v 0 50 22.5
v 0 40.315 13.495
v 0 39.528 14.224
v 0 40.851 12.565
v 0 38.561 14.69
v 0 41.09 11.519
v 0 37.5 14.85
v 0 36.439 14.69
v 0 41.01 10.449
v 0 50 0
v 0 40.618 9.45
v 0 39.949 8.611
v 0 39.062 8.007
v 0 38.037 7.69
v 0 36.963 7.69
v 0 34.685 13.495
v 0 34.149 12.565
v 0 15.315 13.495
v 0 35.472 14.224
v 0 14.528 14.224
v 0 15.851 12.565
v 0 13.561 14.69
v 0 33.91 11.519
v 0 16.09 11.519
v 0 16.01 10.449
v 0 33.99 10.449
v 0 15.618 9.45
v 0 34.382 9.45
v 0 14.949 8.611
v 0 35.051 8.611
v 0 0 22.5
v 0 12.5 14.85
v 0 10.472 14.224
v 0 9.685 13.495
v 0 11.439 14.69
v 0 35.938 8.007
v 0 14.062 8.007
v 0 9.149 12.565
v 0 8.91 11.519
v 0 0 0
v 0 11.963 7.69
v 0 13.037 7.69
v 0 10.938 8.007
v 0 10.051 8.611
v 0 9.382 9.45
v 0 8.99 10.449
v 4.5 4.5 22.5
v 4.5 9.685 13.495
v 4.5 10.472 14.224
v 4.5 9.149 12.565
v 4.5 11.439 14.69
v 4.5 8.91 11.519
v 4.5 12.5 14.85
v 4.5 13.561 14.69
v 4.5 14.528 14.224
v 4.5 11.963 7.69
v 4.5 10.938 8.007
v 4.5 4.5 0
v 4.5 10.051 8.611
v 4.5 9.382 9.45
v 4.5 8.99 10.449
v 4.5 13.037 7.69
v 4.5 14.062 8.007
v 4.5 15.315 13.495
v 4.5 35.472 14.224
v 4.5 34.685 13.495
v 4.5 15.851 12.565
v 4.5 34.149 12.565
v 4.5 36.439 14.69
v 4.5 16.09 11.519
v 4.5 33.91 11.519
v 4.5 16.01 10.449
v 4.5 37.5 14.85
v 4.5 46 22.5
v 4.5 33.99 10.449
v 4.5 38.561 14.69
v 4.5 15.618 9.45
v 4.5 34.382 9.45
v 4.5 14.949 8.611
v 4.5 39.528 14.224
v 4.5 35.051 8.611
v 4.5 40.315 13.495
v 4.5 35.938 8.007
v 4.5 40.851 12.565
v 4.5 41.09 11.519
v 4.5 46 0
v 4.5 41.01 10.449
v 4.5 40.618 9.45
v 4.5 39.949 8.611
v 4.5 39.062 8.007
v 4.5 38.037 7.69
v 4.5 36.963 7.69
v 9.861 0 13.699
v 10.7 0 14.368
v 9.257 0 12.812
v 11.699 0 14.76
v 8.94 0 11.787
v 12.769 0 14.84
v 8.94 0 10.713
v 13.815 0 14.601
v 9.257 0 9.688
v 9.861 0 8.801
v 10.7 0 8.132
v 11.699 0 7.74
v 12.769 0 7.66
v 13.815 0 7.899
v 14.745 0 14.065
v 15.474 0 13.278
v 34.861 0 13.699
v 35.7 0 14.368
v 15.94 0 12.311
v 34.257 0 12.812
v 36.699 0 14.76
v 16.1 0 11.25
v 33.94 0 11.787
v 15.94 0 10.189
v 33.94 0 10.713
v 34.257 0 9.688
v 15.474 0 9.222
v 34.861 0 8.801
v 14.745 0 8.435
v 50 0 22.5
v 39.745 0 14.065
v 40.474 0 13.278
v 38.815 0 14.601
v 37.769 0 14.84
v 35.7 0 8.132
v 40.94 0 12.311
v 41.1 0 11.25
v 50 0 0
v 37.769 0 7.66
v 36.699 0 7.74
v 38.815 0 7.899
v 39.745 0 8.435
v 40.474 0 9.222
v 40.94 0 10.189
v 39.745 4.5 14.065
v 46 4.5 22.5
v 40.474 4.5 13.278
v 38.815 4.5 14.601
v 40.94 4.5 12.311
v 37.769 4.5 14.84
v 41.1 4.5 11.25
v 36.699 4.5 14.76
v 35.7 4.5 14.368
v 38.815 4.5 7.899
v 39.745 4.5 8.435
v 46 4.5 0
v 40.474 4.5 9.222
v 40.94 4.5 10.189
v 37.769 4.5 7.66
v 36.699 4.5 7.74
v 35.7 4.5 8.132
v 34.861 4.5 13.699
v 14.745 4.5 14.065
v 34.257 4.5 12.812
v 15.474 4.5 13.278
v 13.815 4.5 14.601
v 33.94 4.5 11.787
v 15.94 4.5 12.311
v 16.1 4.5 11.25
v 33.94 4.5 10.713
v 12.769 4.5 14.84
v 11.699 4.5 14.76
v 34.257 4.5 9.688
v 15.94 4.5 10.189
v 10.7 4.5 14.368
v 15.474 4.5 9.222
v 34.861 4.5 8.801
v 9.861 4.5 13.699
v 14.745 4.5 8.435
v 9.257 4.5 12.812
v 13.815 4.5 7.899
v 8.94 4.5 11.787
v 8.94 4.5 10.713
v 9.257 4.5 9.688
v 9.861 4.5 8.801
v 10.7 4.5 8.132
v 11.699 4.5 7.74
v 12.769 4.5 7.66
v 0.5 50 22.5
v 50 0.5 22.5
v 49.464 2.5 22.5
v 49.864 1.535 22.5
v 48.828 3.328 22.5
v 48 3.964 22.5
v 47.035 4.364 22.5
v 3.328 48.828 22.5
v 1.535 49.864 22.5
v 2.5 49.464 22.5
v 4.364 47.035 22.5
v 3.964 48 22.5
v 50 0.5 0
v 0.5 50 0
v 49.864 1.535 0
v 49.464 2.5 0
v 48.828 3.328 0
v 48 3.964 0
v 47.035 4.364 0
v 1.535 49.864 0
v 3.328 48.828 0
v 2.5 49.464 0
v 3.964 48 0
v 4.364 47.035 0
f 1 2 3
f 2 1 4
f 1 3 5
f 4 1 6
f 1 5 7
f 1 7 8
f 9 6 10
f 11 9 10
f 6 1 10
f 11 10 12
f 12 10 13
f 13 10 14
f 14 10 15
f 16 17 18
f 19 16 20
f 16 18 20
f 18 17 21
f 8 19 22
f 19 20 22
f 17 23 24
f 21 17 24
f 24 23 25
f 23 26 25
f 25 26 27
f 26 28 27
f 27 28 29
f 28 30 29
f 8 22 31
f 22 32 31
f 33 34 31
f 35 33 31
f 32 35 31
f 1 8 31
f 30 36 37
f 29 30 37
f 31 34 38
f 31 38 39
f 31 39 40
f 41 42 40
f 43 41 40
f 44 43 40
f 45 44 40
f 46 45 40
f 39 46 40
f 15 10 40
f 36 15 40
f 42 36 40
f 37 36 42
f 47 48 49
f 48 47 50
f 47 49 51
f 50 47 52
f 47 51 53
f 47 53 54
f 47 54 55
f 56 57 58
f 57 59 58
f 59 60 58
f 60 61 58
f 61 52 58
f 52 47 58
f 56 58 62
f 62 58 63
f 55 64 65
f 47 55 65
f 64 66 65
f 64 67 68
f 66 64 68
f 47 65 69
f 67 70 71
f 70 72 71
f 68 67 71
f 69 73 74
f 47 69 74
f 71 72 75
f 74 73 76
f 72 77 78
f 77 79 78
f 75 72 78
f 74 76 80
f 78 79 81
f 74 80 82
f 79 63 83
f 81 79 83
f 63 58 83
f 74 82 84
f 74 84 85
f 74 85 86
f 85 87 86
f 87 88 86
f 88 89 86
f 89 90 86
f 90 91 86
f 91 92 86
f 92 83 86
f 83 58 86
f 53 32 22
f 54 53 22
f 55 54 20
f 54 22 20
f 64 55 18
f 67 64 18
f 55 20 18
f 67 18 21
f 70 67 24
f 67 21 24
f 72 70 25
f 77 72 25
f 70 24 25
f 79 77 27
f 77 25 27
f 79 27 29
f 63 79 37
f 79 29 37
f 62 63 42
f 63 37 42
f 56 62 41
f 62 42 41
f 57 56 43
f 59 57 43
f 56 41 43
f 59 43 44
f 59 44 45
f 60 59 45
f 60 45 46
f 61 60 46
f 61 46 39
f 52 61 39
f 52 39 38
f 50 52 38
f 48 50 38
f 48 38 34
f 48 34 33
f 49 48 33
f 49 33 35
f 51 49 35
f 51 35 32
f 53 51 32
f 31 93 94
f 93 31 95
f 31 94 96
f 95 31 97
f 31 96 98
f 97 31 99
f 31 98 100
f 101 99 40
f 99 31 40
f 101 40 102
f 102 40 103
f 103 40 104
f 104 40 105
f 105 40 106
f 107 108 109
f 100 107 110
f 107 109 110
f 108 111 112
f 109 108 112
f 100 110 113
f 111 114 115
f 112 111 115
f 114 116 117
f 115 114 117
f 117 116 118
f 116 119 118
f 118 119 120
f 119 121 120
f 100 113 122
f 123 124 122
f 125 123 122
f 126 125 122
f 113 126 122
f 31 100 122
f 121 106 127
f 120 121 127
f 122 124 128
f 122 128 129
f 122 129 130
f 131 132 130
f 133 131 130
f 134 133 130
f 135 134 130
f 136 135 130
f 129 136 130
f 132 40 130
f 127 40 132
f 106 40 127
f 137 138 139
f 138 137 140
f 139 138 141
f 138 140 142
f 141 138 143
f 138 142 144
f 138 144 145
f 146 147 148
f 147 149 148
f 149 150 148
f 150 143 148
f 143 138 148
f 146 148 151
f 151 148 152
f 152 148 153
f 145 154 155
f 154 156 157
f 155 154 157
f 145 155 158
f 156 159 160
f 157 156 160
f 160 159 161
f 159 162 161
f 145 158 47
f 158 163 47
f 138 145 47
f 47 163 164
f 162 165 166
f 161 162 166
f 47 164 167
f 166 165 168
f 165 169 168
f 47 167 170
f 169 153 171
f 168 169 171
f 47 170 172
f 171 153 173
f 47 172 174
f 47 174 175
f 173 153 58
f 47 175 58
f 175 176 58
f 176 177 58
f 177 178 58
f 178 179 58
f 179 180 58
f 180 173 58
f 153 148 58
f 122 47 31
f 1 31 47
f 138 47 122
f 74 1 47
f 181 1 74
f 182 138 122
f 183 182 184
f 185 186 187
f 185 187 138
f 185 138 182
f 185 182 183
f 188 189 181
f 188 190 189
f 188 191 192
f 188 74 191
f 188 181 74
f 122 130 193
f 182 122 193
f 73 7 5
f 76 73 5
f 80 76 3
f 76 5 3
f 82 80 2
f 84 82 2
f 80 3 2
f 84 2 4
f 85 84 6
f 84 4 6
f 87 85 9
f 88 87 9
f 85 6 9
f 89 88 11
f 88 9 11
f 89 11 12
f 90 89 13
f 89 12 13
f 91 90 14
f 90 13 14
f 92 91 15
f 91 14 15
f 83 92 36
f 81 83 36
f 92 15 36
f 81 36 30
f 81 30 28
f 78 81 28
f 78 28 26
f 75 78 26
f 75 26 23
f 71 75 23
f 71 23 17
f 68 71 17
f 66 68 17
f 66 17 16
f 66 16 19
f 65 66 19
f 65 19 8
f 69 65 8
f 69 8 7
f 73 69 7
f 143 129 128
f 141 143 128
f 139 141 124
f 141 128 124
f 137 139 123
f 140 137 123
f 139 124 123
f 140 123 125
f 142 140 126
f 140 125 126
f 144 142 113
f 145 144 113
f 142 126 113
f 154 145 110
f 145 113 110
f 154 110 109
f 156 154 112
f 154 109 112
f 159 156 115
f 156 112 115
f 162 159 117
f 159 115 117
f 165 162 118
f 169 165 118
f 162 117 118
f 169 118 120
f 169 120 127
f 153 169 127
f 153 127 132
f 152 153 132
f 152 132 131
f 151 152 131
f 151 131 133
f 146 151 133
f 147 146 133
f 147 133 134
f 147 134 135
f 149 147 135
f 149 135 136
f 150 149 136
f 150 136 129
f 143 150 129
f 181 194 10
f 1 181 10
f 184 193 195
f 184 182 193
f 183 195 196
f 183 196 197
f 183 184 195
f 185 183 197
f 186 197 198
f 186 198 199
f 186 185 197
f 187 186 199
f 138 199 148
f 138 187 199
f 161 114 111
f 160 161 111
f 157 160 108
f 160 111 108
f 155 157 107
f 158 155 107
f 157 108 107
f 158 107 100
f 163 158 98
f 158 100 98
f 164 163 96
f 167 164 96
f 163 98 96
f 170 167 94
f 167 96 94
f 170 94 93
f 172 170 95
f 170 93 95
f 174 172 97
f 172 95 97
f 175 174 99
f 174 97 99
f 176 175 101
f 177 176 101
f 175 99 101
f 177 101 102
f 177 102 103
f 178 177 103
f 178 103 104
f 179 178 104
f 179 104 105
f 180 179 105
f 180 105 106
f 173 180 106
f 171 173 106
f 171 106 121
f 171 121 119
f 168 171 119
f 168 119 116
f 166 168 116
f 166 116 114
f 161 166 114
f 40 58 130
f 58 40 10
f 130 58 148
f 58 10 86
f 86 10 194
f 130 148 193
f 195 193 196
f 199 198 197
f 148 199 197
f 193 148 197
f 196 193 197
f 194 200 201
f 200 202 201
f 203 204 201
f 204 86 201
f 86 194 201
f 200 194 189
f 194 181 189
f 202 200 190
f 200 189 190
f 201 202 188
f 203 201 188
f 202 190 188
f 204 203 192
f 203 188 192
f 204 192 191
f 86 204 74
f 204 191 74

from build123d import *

# Parameters (mm, degrees)
BOSS_EXTRUDE1_DEPTH = 22.5
SKETCH2_R           = 3.6
CUT_EXTRUDE1_DEPTH  = 51
SKETCH3_R           = 3.6
CUT_EXTRUDE2_DEPTH  = 51
FILLET1_R           = 4


with BuildPart() as part:
    # Sketch1 → Boss-Extrude1 (new body)
    with BuildSketch(Plane.XY):
        Polygon((0, 50), (0, 0), (50, 0), (50, 4.5), (4.5, 4.5), (4.5, 50), align=None)
    extrude(amount=BOSS_EXTRUDE1_DEPTH)

    # Sketch2 → Cut-Extrude1 (cut, through all)
    with BuildSketch(Plane.ZY):
        with Locations((11.25, 37.5)):
            Circle(SKETCH2_R)
        with Locations((11.25, 12.5)):
            Circle(SKETCH2_R)
    extrude(amount=-CUT_EXTRUDE1_DEPTH, mode=Mode.SUBTRACT)

    # Sketch3 → Cut-Extrude2 (cut, through all)
    with BuildSketch(Plane.XZ):
        with Locations((37.5, 11.25)):
            Circle(SKETCH3_R)
        with Locations((12.5, 11.25)):
            Circle(SKETCH3_R)
    extrude(amount=-CUT_EXTRUDE2_DEPTH, mode=Mode.SUBTRACT)

    # Fillet1
    fillet1_edges = [part.edges().sort_by_distance(p)[0] for p in [
        (4.5, 50, 11.25),
        (50, 4.5, 11.25),
    ]]
    fillet(fillet1_edges, radius=FILLET1_R)


solid = part.part
